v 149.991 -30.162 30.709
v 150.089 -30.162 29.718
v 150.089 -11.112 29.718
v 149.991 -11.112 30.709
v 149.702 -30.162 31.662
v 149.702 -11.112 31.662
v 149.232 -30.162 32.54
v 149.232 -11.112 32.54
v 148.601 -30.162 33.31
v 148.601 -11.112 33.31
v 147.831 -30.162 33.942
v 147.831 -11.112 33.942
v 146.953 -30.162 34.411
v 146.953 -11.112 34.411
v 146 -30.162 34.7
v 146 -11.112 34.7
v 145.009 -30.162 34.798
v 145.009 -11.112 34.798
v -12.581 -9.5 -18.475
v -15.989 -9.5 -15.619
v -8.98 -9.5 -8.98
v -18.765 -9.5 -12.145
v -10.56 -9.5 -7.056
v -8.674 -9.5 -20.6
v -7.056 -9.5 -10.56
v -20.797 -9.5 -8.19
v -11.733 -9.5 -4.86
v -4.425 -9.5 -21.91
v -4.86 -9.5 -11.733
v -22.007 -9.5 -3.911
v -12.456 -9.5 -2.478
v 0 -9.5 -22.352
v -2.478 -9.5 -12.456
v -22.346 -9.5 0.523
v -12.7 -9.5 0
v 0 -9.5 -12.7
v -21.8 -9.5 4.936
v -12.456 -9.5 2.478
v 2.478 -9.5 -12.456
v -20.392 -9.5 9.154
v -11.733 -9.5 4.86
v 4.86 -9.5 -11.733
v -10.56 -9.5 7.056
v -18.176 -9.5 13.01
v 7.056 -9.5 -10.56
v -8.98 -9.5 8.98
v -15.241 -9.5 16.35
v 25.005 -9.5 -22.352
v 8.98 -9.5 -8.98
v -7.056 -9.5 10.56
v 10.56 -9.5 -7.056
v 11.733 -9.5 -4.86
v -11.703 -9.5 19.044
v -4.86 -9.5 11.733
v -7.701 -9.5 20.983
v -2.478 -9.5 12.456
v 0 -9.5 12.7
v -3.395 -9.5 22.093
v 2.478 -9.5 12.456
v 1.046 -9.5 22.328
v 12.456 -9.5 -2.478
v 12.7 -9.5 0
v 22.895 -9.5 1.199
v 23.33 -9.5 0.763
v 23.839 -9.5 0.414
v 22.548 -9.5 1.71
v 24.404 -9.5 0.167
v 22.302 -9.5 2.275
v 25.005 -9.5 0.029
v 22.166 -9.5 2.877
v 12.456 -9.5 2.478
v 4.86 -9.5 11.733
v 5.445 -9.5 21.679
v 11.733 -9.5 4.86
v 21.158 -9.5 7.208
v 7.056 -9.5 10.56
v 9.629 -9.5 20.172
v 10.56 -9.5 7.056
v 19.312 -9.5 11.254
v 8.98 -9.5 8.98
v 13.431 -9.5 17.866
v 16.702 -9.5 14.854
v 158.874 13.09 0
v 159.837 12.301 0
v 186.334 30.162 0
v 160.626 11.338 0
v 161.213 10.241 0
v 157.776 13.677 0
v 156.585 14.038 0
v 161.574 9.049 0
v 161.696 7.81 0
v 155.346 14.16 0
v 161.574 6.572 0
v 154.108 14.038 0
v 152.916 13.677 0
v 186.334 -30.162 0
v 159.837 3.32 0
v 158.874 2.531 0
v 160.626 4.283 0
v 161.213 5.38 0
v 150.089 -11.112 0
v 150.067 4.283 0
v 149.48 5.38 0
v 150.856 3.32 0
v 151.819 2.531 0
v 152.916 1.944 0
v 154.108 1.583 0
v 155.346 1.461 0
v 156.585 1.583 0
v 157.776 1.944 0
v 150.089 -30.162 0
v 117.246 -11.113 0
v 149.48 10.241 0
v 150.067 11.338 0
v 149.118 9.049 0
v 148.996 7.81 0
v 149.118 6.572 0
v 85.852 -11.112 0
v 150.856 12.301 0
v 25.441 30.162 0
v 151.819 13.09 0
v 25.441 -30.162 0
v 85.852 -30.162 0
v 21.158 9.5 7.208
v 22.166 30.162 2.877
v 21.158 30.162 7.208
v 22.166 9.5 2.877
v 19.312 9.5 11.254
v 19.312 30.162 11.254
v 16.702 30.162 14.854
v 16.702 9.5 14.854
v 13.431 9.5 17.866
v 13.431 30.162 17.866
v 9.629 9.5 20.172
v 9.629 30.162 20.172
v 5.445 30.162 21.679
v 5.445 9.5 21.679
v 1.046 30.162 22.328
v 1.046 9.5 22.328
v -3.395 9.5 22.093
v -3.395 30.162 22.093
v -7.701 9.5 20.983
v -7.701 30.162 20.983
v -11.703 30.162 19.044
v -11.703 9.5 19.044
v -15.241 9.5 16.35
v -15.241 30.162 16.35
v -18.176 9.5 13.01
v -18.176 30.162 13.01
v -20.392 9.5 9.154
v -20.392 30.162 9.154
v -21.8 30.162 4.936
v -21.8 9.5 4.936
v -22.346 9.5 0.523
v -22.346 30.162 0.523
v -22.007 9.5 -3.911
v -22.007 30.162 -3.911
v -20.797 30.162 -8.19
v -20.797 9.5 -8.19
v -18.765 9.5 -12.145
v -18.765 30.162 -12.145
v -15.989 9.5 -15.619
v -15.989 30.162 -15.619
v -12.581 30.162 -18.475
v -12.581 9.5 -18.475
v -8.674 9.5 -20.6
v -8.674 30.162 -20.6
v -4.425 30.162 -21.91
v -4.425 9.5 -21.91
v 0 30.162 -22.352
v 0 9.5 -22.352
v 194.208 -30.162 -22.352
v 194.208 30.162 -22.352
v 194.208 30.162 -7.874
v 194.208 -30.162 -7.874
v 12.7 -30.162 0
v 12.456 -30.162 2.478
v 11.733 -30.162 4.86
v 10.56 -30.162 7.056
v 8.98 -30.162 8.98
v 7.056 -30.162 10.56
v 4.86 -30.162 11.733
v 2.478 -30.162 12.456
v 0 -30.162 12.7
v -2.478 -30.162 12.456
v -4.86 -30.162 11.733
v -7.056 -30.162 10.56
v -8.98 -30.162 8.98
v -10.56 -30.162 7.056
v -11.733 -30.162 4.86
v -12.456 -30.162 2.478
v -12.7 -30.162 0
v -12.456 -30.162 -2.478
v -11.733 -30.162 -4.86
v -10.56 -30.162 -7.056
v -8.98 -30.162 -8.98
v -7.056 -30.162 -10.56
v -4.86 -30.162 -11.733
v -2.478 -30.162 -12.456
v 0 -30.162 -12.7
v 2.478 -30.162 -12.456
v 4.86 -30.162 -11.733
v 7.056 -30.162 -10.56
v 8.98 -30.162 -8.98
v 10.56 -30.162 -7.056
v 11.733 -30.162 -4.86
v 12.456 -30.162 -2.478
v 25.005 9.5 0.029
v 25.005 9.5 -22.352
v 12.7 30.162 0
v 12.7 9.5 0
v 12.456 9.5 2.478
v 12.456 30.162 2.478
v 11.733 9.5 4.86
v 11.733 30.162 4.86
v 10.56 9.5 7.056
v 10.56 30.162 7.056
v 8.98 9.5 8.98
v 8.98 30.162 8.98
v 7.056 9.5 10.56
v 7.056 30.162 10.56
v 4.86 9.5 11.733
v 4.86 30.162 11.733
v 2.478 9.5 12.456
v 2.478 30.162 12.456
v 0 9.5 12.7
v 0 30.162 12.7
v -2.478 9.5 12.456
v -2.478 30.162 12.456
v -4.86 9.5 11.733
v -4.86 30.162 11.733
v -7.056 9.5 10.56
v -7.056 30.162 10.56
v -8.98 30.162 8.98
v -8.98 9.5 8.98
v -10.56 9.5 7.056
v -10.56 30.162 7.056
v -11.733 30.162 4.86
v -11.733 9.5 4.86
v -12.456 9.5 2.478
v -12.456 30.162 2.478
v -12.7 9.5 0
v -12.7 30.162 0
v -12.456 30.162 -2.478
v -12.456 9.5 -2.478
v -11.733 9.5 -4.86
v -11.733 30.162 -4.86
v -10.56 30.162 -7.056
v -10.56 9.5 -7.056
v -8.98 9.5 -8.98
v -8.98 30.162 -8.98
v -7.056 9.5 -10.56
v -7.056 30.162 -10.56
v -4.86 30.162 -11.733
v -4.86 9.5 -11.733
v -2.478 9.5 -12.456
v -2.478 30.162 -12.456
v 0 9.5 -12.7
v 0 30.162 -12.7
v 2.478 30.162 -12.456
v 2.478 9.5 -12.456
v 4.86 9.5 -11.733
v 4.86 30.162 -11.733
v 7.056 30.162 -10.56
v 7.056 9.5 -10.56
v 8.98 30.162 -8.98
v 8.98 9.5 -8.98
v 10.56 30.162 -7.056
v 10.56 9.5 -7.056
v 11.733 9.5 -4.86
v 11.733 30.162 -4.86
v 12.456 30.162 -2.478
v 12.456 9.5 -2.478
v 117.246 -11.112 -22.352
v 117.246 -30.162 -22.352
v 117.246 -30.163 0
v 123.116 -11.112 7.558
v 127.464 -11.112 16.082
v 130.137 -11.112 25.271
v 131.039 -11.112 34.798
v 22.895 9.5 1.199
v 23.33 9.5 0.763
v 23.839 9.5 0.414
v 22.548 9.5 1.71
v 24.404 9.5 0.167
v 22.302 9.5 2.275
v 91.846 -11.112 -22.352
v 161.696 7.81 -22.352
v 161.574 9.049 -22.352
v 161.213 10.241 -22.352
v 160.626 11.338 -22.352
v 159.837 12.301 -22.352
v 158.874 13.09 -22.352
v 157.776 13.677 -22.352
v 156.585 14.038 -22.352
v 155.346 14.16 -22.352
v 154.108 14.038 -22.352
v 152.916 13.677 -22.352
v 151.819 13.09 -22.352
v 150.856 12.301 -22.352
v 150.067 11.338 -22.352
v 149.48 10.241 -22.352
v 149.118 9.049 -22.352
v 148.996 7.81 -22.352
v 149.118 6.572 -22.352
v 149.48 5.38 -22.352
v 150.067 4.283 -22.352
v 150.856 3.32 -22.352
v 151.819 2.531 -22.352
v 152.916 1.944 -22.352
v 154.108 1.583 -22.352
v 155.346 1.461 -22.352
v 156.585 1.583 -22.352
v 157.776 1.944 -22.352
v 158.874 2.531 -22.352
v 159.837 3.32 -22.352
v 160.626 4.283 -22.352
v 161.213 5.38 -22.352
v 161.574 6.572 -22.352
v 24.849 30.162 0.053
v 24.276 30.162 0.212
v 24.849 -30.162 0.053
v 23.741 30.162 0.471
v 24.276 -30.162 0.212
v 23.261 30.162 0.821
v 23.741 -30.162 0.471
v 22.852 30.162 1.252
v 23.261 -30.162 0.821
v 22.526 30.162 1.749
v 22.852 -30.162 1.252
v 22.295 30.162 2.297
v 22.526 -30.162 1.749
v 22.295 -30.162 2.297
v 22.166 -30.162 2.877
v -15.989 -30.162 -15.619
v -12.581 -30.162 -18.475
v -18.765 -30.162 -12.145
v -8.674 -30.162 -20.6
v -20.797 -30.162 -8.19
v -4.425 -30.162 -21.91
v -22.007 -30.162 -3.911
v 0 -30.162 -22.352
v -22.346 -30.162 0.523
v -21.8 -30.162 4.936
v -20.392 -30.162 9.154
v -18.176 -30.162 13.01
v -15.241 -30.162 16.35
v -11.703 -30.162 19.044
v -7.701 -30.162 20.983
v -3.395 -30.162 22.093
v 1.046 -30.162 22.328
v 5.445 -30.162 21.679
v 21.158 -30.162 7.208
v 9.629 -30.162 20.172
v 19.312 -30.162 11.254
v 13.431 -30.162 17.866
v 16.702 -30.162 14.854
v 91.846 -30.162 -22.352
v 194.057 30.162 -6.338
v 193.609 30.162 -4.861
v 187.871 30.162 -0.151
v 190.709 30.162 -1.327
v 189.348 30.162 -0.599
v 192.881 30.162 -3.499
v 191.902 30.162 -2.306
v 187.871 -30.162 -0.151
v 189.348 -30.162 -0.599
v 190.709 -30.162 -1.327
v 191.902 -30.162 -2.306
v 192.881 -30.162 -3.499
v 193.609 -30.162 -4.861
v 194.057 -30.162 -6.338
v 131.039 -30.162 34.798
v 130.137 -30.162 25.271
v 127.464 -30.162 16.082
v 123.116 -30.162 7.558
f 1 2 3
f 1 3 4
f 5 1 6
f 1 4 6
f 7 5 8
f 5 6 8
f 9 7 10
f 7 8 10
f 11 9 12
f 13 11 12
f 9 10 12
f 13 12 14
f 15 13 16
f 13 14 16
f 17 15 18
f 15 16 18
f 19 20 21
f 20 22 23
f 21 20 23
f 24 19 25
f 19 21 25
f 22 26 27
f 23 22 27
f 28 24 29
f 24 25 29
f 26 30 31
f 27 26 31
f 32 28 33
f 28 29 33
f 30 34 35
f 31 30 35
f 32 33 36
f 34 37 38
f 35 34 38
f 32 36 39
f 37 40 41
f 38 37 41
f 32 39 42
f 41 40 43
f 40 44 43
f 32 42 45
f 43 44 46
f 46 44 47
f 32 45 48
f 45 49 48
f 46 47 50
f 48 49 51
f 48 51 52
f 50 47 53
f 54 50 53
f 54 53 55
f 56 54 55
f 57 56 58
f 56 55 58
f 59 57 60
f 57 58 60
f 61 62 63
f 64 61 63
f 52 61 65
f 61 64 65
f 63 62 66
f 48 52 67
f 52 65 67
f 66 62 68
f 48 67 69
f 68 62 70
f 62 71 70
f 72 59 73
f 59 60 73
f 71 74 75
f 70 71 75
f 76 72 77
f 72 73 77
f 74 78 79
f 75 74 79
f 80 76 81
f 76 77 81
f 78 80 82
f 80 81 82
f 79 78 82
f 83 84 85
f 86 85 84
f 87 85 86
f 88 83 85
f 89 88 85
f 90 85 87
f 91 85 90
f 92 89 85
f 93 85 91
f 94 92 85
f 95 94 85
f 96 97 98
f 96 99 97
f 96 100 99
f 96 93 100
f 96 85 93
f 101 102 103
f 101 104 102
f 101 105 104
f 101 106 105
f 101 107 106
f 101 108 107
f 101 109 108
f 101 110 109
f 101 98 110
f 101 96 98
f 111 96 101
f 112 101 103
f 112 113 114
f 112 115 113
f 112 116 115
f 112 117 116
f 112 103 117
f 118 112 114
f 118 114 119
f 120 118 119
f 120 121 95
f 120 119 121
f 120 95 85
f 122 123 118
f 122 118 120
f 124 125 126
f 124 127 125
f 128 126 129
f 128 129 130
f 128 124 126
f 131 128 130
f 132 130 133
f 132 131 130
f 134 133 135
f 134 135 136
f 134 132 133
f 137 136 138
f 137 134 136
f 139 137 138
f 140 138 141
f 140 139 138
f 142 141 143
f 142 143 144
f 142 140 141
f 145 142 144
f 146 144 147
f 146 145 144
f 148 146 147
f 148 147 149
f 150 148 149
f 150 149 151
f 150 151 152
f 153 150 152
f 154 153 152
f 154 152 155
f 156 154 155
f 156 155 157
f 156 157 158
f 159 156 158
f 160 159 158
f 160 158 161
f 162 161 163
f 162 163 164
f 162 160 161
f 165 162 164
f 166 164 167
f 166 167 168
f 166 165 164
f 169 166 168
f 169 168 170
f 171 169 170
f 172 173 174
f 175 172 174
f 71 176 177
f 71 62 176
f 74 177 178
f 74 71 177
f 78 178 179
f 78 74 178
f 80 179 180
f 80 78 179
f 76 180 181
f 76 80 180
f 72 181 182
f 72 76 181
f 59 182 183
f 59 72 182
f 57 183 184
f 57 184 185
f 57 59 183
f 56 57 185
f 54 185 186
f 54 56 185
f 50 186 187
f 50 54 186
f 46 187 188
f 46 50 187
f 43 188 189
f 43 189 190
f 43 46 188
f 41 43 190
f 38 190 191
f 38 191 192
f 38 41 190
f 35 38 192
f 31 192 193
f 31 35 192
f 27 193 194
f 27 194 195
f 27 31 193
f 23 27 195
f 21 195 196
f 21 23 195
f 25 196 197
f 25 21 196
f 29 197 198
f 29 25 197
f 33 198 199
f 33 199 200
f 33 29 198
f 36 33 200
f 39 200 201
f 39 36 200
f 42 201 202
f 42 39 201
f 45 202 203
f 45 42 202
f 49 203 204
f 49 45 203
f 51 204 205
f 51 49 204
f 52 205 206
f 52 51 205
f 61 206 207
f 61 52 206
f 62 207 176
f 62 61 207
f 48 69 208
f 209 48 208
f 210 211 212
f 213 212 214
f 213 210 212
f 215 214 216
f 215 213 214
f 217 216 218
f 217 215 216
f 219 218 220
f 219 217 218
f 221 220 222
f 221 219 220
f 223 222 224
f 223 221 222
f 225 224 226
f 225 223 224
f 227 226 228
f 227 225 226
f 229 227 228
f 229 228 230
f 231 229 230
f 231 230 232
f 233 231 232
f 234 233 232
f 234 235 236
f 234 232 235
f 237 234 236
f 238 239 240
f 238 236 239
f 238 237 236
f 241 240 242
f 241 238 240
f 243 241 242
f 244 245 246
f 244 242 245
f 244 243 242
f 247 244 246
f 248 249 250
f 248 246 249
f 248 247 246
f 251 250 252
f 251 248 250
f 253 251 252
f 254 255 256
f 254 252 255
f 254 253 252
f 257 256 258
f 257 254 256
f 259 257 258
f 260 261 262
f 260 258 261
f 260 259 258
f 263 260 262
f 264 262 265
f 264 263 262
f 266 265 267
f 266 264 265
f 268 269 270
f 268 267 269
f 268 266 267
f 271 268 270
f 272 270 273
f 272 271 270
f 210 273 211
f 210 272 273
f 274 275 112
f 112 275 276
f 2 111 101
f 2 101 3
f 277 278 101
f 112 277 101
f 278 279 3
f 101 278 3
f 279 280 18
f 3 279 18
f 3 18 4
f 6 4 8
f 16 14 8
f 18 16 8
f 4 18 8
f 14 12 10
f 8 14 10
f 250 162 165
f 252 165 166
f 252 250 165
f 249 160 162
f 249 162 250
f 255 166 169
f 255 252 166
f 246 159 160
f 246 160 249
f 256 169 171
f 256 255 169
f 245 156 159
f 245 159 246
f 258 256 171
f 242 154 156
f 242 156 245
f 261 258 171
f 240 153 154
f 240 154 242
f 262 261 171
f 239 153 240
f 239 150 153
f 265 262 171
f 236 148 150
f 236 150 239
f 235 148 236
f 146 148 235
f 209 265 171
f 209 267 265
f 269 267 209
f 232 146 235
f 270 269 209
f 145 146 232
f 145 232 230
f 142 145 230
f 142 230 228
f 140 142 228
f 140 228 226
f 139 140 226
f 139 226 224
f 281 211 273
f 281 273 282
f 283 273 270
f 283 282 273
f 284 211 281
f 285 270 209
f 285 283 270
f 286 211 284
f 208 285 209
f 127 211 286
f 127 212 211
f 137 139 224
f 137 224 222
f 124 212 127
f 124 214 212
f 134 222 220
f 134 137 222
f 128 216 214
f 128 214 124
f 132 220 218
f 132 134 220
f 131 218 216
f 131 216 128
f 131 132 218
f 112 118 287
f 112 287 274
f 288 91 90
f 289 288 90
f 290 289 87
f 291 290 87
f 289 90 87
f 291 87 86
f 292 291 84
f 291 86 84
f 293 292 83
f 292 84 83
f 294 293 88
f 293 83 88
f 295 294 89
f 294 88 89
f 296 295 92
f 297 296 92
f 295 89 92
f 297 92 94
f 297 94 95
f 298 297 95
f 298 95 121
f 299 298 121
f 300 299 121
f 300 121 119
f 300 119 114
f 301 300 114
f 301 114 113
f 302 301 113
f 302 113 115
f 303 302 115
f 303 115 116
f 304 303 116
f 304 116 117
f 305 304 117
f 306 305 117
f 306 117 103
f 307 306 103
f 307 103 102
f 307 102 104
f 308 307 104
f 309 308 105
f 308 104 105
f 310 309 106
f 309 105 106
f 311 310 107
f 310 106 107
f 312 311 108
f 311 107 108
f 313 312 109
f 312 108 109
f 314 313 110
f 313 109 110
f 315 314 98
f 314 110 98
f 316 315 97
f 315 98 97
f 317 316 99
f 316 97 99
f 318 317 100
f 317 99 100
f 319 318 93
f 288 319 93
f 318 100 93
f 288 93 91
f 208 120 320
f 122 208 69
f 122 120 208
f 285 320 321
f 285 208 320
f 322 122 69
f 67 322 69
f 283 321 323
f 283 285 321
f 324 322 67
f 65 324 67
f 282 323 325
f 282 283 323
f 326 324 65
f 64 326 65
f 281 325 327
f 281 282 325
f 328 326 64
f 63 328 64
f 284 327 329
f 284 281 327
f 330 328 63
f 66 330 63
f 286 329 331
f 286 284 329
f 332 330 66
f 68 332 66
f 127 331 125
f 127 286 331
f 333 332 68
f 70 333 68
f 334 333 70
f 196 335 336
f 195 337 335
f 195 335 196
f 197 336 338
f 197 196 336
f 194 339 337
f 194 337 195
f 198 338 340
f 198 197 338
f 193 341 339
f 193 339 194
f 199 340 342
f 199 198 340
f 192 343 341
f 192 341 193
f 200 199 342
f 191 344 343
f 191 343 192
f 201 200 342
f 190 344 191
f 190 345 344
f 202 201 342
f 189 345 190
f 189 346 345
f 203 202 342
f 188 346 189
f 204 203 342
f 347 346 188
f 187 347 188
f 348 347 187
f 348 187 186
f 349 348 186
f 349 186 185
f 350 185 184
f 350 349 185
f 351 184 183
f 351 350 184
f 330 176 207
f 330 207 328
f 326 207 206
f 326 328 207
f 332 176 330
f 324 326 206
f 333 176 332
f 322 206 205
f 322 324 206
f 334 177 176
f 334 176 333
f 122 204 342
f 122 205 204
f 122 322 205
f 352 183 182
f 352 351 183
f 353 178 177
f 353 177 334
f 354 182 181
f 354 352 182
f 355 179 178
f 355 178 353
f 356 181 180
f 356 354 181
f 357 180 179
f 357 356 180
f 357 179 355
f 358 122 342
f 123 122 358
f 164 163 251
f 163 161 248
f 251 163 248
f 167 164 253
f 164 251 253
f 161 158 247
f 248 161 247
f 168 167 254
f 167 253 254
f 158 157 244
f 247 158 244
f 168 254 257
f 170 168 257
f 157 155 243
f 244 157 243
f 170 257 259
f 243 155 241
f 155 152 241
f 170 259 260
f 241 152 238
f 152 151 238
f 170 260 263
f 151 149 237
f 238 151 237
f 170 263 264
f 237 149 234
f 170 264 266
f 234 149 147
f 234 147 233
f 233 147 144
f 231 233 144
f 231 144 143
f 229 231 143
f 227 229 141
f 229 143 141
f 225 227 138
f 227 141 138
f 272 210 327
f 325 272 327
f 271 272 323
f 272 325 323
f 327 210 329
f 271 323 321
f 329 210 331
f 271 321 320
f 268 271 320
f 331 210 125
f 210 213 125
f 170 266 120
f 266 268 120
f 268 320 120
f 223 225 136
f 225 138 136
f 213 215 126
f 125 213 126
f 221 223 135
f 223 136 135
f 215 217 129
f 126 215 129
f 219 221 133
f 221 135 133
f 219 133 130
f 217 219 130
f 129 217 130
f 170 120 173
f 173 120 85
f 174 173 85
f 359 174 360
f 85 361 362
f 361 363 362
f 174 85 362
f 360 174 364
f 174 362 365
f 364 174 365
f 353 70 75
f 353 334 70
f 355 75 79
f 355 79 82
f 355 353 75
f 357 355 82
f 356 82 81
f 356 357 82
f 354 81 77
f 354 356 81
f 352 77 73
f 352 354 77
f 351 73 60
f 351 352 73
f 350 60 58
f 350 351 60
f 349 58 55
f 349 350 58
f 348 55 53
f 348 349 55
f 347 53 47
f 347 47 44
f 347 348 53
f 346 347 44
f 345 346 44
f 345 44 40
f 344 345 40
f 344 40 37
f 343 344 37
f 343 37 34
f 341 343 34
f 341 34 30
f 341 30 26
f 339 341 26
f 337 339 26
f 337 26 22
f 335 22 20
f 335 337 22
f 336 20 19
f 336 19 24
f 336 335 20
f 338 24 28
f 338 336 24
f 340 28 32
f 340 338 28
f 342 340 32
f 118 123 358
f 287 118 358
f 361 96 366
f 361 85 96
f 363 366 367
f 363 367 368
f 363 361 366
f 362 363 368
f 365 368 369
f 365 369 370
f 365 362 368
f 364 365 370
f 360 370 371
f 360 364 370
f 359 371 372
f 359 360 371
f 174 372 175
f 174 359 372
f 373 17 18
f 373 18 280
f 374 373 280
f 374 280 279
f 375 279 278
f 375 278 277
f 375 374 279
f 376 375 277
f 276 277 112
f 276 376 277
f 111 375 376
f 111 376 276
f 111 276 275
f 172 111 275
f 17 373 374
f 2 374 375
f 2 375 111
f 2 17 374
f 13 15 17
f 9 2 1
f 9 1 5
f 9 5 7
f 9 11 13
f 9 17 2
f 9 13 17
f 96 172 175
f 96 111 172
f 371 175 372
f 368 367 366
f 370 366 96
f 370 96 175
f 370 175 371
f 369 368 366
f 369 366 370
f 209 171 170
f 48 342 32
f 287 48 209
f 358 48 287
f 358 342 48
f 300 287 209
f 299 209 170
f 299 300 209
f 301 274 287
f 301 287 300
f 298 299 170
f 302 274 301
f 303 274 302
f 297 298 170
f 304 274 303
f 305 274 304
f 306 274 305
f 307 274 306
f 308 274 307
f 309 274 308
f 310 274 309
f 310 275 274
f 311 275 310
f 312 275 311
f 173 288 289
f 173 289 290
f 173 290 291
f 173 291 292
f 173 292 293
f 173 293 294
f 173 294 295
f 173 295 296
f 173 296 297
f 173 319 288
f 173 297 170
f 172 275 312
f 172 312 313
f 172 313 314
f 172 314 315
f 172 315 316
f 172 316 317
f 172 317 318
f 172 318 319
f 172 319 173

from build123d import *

# Parameters (mm, degrees)
F0_R          = 12.7
F1_DEPTH      = 30.1625
F2_R          = 6.35
F2_W          = 50.010991877
F2_H          = 18.9992
F3_DEPTH      = 22.353
F3_DEPTH_BACK = 25.4
F5_DEPTH      = 19.05
F7_DEPTH      = 19.05
F8_R          = 5.08
F9_R          = 7.874
F10_R         = 3.302


with BuildPart() as f1:
    # F0 (on Front) → F1 (new body, symmetric)
    with BuildSketch(Plane.XZ):
        with BuildLine():
            Line((194.2084, 0), (22.352, 0))
            ThreePointArc((22.352, 0), (-15.8052507731, 15.8052507731), (0, -22.352))
            Line((0, -22.352), (194.2084, -22.352))
            Line((194.2084, -22.352), (194.2084, 0))
        make_face()
        Circle(F0_R, mode=Mode.SUBTRACT)
    extrude(amount=F1_DEPTH, both=True)

    # F2 (on Top) → F3 (cut, two sides)
    with BuildSketch(Plane.XY) as f3_sk:
        with Locations((155.3464, 7.8105)):
            Circle(F2_R)
        Rectangle(F2_W, F2_H)
    extrude(amount=-F3_DEPTH, mode=Mode.SUBTRACT)
    extrude(f3_sk.sketch, amount=F3_DEPTH_BACK, mode=Mode.SUBTRACT)

    # F4 (on face) → F5 (cut)
    with BuildSketch(Plane.XZ.offset(30.1625)):
        Polygon((117.2464, -22.352), (117.2464, 0), (85.852, 0), (91.8464, -22.352), align=None)
    extrude(amount=-F5_DEPTH, mode=Mode.SUBTRACT)

    # F6 (on face) → F7 (join)
    with BuildSketch(Plane.XZ.offset(30.1625)):
        with BuildLine():
            Line((117.2464, 0), (150.0886, 0))
            Line((150.0886, 0), (150.0886, 34.798))
            Line((150.0886, 34.798), (131.0386, 34.798))
            ThreePointArc((131.0386, 34.798), (127.4644153616, 16.0823576341), (117.2464, 0))
        make_face()
    extrude(amount=-F7_DEPTH)

    # F8
    f8_edges = [f1.edges().sort_by_distance(p)[0] for p in [
        (150.0886, -20.6375, 34.798),
    ]]
    fillet(f8_edges, radius=F8_R)

    # F9
    f9_edges = [f1.edges().sort_by_distance(p)[0] for p in [
        (194.2084, 0, 0),
    ]]
    fillet(f9_edges, radius=F9_R)

    # F10
    f10_edges = [f1.edges().sort_by_distance(p)[0] for p in [
        (22.352, -19.83105, 0),
    ]]
    fillet(f10_edges, radius=F10_R)


solid = f1.part
